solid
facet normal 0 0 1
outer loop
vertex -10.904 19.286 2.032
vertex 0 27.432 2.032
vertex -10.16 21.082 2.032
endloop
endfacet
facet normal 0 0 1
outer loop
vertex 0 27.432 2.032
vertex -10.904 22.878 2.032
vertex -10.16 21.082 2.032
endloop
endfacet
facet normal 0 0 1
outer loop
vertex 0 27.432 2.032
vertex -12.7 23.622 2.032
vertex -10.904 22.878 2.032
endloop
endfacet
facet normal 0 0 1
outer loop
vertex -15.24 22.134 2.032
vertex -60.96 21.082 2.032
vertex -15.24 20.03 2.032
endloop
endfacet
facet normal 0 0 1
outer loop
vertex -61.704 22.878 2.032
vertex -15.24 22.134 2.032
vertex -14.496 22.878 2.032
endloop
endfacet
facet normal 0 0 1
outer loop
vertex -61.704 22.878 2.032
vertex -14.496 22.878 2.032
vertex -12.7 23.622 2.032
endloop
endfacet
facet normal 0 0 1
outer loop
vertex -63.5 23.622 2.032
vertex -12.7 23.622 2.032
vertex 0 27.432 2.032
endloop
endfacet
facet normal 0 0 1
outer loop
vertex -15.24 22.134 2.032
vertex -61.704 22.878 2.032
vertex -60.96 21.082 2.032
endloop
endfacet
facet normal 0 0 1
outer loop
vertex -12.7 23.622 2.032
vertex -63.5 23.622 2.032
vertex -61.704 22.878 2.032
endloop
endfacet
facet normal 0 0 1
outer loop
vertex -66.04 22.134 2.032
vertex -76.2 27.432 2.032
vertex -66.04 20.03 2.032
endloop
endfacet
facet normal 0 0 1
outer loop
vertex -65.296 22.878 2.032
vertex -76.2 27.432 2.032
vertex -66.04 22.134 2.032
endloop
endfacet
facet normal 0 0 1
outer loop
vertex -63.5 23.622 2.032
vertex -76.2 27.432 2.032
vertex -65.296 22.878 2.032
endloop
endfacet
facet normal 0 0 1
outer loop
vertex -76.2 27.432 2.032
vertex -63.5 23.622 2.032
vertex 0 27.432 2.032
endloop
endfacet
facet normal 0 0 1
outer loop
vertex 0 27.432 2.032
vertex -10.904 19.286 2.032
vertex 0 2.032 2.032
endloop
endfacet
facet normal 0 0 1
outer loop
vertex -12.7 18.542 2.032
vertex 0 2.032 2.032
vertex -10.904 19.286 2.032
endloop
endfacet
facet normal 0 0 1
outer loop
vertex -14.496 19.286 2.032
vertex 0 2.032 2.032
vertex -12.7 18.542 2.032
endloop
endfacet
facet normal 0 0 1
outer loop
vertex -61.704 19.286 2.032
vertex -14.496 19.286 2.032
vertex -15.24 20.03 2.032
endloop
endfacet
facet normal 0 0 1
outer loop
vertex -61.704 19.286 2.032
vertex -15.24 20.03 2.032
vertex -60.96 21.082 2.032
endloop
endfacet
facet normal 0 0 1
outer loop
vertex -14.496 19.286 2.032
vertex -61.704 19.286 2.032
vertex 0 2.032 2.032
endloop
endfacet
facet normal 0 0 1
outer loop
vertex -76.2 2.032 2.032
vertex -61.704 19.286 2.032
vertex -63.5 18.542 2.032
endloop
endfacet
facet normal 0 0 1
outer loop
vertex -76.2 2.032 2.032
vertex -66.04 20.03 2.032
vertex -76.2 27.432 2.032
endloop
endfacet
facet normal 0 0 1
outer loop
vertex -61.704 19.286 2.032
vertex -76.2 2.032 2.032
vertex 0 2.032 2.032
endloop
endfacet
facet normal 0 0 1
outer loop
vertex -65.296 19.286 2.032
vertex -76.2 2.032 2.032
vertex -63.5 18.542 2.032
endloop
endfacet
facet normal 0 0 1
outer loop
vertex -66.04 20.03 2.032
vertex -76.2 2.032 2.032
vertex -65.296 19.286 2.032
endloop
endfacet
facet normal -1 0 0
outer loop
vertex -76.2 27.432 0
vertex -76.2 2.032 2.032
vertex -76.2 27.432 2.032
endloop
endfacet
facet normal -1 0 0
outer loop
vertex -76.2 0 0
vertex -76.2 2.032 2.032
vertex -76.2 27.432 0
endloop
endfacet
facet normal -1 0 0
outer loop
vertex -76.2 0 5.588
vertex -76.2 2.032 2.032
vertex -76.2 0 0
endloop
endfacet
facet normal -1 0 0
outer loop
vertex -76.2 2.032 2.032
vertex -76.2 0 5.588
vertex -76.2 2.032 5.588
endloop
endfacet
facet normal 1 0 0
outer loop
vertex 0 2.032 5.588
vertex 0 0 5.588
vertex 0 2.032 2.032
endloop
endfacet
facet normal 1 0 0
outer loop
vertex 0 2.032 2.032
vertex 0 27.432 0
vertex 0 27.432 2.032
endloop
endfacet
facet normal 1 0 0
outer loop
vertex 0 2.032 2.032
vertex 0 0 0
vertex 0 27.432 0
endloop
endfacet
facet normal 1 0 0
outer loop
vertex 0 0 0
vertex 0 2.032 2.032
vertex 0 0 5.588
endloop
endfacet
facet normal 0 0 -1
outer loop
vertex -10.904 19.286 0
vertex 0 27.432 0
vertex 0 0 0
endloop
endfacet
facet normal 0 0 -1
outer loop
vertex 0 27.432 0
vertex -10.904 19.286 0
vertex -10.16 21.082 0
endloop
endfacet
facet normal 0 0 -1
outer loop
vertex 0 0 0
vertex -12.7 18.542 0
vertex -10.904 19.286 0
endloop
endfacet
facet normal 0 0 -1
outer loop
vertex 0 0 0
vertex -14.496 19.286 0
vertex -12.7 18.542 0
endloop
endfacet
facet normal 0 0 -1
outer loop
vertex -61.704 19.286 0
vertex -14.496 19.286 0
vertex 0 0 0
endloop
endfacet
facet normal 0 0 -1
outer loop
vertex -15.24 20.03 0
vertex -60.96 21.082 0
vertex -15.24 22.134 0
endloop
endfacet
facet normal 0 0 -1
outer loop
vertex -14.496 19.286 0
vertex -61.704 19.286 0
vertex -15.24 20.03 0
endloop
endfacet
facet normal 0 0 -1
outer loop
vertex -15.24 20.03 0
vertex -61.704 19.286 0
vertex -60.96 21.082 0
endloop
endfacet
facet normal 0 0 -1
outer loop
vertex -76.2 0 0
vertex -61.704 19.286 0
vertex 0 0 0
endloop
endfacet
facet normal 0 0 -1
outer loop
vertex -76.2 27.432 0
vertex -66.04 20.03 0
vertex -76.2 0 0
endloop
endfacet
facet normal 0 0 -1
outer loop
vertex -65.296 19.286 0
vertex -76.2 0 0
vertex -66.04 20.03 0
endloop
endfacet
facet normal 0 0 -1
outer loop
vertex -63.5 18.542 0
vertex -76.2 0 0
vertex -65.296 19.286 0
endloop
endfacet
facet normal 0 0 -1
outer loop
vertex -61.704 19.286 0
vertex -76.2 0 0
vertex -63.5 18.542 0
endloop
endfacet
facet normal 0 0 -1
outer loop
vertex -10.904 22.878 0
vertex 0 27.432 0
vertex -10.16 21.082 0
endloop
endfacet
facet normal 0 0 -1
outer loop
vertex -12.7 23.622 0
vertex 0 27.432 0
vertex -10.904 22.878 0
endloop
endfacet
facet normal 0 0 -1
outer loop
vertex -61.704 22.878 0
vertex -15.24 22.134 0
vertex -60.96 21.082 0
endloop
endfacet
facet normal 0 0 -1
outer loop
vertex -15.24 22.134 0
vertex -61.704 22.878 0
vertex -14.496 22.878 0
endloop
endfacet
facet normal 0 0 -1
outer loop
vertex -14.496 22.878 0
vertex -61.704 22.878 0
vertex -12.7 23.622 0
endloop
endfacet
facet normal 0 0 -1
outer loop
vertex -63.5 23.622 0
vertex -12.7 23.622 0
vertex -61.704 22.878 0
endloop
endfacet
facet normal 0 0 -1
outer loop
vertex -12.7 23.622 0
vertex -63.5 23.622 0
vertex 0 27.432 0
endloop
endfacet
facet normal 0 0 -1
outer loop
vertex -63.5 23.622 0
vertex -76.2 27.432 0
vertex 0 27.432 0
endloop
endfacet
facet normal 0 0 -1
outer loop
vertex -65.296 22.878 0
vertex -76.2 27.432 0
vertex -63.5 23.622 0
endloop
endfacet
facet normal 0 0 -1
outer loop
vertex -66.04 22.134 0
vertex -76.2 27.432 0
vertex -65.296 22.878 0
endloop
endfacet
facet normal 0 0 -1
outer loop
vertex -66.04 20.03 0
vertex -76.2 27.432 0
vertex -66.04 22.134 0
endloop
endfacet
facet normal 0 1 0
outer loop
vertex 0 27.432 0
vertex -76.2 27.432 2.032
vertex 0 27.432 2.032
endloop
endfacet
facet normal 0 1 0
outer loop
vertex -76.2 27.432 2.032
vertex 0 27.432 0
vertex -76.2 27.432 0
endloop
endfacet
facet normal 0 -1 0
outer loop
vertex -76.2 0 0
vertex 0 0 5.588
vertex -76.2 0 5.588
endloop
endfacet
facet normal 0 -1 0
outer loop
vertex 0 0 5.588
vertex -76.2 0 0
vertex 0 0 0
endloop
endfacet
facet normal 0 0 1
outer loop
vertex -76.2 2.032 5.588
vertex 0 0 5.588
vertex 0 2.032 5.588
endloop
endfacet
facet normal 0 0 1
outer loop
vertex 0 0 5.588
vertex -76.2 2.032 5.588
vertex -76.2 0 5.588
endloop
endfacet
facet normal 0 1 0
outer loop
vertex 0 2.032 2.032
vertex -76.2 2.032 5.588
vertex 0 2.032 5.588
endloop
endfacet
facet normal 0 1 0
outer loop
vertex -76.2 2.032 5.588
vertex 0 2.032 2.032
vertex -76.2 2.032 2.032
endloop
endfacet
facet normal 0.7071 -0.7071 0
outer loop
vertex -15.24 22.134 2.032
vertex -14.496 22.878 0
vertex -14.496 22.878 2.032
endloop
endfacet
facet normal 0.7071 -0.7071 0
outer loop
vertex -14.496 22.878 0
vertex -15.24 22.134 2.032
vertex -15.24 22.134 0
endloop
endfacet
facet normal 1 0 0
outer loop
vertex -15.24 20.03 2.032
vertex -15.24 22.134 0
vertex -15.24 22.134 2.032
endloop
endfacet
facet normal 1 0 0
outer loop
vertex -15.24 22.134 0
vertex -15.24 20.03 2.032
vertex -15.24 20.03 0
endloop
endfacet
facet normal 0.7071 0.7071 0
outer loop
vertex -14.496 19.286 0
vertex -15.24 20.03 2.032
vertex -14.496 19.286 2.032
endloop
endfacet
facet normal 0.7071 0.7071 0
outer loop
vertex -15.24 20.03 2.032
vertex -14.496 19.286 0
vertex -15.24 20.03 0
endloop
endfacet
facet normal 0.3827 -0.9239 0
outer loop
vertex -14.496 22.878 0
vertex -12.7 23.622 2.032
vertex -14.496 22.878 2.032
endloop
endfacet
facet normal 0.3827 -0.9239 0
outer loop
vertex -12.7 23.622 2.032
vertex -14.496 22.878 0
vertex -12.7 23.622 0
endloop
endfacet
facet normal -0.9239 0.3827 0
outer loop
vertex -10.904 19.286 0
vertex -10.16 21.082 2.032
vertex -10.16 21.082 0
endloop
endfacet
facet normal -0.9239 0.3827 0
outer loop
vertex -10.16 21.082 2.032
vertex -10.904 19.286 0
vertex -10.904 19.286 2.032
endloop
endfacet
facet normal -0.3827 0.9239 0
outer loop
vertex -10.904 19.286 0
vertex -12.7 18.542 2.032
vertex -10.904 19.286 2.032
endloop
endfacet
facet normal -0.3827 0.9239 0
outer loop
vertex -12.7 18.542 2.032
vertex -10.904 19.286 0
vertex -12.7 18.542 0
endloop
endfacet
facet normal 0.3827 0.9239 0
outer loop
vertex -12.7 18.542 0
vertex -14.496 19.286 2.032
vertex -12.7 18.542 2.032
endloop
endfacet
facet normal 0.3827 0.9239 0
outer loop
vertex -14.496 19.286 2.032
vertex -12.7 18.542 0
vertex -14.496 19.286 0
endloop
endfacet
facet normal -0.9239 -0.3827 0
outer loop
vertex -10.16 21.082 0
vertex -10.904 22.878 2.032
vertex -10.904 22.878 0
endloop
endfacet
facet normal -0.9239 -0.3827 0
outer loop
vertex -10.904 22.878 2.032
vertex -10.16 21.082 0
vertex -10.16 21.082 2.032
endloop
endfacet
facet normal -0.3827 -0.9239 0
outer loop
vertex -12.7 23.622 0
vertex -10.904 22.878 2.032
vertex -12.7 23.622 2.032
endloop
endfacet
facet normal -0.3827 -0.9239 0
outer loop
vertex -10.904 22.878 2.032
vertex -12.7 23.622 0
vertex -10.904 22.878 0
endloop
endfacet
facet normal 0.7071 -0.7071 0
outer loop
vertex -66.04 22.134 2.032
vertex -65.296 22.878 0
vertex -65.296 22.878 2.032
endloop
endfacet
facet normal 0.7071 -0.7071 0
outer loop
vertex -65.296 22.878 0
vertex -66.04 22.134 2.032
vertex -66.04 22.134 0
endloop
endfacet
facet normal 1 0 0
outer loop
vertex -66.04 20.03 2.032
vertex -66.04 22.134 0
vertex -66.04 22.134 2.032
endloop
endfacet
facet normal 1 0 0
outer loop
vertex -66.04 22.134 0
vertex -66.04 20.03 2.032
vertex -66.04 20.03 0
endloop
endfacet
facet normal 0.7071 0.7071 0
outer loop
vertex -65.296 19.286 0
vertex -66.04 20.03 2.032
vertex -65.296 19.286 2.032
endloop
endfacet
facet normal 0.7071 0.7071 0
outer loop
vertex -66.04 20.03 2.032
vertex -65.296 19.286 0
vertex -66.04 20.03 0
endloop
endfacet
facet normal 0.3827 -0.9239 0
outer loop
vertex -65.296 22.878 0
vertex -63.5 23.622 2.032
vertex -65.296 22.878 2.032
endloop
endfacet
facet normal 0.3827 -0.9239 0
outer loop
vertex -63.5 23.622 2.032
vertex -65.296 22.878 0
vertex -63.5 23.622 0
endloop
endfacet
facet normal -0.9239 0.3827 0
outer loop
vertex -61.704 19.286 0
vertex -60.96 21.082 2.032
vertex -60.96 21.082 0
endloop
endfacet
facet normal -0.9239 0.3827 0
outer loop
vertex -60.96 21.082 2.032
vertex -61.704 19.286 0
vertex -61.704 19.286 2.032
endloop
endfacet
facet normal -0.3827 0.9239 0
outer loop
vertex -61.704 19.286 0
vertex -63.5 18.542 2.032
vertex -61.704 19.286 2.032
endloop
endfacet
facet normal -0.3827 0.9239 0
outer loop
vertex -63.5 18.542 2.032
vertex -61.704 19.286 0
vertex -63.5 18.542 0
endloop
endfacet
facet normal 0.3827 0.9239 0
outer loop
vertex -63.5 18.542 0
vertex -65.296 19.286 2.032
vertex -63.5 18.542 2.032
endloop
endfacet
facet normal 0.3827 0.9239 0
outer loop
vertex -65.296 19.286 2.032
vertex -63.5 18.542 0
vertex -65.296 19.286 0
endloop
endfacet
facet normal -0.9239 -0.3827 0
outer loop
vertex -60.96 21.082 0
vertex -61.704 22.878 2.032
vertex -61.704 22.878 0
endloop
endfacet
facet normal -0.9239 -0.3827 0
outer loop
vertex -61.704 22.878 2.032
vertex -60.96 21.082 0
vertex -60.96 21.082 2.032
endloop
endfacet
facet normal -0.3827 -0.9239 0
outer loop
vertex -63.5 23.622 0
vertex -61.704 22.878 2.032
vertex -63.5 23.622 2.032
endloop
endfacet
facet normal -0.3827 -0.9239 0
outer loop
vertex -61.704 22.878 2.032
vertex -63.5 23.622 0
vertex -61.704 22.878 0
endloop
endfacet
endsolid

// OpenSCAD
in = 25.4;

wall = .08*in;
base_wall = .08*in;

x = .22*in;
y = 1*in+base_wall;
z = 3*in;

hole_sep = 2*in;
hole_y = y - .25*in;
hole_r = .2*in/2;

rotate([0,-90,0])
guide();

module guide(){
	difference(){
		union(){
			cube([wall, y, z]);
			cube([x, base_wall, z]);
		}
	
		//holes
		translate([-.1,hole_y,z/2]) for(i=[-1,1]) translate([0,0,i*hole_sep/2]) rotate([0,90,0]) rotate([0,0,-90]) cap_cylinder(r=hole_r, h=wall+1);
	}
}


module cap_cylinder(r=1, h=1, center=false){
	render() union(){
		cylinder(r=r, h=h, center=center);
		intersection(){
			rotate([0,0,22.5]) cylinder(r=r/cos(180/8), h=h, $fn=8, center=center);
			translate([0,-r/cos(180/4),0]) rotate([0,0,0]) cylinder(r=r/cos(180/4), h=h, $fn=4, center=center);
		}
	}
}
